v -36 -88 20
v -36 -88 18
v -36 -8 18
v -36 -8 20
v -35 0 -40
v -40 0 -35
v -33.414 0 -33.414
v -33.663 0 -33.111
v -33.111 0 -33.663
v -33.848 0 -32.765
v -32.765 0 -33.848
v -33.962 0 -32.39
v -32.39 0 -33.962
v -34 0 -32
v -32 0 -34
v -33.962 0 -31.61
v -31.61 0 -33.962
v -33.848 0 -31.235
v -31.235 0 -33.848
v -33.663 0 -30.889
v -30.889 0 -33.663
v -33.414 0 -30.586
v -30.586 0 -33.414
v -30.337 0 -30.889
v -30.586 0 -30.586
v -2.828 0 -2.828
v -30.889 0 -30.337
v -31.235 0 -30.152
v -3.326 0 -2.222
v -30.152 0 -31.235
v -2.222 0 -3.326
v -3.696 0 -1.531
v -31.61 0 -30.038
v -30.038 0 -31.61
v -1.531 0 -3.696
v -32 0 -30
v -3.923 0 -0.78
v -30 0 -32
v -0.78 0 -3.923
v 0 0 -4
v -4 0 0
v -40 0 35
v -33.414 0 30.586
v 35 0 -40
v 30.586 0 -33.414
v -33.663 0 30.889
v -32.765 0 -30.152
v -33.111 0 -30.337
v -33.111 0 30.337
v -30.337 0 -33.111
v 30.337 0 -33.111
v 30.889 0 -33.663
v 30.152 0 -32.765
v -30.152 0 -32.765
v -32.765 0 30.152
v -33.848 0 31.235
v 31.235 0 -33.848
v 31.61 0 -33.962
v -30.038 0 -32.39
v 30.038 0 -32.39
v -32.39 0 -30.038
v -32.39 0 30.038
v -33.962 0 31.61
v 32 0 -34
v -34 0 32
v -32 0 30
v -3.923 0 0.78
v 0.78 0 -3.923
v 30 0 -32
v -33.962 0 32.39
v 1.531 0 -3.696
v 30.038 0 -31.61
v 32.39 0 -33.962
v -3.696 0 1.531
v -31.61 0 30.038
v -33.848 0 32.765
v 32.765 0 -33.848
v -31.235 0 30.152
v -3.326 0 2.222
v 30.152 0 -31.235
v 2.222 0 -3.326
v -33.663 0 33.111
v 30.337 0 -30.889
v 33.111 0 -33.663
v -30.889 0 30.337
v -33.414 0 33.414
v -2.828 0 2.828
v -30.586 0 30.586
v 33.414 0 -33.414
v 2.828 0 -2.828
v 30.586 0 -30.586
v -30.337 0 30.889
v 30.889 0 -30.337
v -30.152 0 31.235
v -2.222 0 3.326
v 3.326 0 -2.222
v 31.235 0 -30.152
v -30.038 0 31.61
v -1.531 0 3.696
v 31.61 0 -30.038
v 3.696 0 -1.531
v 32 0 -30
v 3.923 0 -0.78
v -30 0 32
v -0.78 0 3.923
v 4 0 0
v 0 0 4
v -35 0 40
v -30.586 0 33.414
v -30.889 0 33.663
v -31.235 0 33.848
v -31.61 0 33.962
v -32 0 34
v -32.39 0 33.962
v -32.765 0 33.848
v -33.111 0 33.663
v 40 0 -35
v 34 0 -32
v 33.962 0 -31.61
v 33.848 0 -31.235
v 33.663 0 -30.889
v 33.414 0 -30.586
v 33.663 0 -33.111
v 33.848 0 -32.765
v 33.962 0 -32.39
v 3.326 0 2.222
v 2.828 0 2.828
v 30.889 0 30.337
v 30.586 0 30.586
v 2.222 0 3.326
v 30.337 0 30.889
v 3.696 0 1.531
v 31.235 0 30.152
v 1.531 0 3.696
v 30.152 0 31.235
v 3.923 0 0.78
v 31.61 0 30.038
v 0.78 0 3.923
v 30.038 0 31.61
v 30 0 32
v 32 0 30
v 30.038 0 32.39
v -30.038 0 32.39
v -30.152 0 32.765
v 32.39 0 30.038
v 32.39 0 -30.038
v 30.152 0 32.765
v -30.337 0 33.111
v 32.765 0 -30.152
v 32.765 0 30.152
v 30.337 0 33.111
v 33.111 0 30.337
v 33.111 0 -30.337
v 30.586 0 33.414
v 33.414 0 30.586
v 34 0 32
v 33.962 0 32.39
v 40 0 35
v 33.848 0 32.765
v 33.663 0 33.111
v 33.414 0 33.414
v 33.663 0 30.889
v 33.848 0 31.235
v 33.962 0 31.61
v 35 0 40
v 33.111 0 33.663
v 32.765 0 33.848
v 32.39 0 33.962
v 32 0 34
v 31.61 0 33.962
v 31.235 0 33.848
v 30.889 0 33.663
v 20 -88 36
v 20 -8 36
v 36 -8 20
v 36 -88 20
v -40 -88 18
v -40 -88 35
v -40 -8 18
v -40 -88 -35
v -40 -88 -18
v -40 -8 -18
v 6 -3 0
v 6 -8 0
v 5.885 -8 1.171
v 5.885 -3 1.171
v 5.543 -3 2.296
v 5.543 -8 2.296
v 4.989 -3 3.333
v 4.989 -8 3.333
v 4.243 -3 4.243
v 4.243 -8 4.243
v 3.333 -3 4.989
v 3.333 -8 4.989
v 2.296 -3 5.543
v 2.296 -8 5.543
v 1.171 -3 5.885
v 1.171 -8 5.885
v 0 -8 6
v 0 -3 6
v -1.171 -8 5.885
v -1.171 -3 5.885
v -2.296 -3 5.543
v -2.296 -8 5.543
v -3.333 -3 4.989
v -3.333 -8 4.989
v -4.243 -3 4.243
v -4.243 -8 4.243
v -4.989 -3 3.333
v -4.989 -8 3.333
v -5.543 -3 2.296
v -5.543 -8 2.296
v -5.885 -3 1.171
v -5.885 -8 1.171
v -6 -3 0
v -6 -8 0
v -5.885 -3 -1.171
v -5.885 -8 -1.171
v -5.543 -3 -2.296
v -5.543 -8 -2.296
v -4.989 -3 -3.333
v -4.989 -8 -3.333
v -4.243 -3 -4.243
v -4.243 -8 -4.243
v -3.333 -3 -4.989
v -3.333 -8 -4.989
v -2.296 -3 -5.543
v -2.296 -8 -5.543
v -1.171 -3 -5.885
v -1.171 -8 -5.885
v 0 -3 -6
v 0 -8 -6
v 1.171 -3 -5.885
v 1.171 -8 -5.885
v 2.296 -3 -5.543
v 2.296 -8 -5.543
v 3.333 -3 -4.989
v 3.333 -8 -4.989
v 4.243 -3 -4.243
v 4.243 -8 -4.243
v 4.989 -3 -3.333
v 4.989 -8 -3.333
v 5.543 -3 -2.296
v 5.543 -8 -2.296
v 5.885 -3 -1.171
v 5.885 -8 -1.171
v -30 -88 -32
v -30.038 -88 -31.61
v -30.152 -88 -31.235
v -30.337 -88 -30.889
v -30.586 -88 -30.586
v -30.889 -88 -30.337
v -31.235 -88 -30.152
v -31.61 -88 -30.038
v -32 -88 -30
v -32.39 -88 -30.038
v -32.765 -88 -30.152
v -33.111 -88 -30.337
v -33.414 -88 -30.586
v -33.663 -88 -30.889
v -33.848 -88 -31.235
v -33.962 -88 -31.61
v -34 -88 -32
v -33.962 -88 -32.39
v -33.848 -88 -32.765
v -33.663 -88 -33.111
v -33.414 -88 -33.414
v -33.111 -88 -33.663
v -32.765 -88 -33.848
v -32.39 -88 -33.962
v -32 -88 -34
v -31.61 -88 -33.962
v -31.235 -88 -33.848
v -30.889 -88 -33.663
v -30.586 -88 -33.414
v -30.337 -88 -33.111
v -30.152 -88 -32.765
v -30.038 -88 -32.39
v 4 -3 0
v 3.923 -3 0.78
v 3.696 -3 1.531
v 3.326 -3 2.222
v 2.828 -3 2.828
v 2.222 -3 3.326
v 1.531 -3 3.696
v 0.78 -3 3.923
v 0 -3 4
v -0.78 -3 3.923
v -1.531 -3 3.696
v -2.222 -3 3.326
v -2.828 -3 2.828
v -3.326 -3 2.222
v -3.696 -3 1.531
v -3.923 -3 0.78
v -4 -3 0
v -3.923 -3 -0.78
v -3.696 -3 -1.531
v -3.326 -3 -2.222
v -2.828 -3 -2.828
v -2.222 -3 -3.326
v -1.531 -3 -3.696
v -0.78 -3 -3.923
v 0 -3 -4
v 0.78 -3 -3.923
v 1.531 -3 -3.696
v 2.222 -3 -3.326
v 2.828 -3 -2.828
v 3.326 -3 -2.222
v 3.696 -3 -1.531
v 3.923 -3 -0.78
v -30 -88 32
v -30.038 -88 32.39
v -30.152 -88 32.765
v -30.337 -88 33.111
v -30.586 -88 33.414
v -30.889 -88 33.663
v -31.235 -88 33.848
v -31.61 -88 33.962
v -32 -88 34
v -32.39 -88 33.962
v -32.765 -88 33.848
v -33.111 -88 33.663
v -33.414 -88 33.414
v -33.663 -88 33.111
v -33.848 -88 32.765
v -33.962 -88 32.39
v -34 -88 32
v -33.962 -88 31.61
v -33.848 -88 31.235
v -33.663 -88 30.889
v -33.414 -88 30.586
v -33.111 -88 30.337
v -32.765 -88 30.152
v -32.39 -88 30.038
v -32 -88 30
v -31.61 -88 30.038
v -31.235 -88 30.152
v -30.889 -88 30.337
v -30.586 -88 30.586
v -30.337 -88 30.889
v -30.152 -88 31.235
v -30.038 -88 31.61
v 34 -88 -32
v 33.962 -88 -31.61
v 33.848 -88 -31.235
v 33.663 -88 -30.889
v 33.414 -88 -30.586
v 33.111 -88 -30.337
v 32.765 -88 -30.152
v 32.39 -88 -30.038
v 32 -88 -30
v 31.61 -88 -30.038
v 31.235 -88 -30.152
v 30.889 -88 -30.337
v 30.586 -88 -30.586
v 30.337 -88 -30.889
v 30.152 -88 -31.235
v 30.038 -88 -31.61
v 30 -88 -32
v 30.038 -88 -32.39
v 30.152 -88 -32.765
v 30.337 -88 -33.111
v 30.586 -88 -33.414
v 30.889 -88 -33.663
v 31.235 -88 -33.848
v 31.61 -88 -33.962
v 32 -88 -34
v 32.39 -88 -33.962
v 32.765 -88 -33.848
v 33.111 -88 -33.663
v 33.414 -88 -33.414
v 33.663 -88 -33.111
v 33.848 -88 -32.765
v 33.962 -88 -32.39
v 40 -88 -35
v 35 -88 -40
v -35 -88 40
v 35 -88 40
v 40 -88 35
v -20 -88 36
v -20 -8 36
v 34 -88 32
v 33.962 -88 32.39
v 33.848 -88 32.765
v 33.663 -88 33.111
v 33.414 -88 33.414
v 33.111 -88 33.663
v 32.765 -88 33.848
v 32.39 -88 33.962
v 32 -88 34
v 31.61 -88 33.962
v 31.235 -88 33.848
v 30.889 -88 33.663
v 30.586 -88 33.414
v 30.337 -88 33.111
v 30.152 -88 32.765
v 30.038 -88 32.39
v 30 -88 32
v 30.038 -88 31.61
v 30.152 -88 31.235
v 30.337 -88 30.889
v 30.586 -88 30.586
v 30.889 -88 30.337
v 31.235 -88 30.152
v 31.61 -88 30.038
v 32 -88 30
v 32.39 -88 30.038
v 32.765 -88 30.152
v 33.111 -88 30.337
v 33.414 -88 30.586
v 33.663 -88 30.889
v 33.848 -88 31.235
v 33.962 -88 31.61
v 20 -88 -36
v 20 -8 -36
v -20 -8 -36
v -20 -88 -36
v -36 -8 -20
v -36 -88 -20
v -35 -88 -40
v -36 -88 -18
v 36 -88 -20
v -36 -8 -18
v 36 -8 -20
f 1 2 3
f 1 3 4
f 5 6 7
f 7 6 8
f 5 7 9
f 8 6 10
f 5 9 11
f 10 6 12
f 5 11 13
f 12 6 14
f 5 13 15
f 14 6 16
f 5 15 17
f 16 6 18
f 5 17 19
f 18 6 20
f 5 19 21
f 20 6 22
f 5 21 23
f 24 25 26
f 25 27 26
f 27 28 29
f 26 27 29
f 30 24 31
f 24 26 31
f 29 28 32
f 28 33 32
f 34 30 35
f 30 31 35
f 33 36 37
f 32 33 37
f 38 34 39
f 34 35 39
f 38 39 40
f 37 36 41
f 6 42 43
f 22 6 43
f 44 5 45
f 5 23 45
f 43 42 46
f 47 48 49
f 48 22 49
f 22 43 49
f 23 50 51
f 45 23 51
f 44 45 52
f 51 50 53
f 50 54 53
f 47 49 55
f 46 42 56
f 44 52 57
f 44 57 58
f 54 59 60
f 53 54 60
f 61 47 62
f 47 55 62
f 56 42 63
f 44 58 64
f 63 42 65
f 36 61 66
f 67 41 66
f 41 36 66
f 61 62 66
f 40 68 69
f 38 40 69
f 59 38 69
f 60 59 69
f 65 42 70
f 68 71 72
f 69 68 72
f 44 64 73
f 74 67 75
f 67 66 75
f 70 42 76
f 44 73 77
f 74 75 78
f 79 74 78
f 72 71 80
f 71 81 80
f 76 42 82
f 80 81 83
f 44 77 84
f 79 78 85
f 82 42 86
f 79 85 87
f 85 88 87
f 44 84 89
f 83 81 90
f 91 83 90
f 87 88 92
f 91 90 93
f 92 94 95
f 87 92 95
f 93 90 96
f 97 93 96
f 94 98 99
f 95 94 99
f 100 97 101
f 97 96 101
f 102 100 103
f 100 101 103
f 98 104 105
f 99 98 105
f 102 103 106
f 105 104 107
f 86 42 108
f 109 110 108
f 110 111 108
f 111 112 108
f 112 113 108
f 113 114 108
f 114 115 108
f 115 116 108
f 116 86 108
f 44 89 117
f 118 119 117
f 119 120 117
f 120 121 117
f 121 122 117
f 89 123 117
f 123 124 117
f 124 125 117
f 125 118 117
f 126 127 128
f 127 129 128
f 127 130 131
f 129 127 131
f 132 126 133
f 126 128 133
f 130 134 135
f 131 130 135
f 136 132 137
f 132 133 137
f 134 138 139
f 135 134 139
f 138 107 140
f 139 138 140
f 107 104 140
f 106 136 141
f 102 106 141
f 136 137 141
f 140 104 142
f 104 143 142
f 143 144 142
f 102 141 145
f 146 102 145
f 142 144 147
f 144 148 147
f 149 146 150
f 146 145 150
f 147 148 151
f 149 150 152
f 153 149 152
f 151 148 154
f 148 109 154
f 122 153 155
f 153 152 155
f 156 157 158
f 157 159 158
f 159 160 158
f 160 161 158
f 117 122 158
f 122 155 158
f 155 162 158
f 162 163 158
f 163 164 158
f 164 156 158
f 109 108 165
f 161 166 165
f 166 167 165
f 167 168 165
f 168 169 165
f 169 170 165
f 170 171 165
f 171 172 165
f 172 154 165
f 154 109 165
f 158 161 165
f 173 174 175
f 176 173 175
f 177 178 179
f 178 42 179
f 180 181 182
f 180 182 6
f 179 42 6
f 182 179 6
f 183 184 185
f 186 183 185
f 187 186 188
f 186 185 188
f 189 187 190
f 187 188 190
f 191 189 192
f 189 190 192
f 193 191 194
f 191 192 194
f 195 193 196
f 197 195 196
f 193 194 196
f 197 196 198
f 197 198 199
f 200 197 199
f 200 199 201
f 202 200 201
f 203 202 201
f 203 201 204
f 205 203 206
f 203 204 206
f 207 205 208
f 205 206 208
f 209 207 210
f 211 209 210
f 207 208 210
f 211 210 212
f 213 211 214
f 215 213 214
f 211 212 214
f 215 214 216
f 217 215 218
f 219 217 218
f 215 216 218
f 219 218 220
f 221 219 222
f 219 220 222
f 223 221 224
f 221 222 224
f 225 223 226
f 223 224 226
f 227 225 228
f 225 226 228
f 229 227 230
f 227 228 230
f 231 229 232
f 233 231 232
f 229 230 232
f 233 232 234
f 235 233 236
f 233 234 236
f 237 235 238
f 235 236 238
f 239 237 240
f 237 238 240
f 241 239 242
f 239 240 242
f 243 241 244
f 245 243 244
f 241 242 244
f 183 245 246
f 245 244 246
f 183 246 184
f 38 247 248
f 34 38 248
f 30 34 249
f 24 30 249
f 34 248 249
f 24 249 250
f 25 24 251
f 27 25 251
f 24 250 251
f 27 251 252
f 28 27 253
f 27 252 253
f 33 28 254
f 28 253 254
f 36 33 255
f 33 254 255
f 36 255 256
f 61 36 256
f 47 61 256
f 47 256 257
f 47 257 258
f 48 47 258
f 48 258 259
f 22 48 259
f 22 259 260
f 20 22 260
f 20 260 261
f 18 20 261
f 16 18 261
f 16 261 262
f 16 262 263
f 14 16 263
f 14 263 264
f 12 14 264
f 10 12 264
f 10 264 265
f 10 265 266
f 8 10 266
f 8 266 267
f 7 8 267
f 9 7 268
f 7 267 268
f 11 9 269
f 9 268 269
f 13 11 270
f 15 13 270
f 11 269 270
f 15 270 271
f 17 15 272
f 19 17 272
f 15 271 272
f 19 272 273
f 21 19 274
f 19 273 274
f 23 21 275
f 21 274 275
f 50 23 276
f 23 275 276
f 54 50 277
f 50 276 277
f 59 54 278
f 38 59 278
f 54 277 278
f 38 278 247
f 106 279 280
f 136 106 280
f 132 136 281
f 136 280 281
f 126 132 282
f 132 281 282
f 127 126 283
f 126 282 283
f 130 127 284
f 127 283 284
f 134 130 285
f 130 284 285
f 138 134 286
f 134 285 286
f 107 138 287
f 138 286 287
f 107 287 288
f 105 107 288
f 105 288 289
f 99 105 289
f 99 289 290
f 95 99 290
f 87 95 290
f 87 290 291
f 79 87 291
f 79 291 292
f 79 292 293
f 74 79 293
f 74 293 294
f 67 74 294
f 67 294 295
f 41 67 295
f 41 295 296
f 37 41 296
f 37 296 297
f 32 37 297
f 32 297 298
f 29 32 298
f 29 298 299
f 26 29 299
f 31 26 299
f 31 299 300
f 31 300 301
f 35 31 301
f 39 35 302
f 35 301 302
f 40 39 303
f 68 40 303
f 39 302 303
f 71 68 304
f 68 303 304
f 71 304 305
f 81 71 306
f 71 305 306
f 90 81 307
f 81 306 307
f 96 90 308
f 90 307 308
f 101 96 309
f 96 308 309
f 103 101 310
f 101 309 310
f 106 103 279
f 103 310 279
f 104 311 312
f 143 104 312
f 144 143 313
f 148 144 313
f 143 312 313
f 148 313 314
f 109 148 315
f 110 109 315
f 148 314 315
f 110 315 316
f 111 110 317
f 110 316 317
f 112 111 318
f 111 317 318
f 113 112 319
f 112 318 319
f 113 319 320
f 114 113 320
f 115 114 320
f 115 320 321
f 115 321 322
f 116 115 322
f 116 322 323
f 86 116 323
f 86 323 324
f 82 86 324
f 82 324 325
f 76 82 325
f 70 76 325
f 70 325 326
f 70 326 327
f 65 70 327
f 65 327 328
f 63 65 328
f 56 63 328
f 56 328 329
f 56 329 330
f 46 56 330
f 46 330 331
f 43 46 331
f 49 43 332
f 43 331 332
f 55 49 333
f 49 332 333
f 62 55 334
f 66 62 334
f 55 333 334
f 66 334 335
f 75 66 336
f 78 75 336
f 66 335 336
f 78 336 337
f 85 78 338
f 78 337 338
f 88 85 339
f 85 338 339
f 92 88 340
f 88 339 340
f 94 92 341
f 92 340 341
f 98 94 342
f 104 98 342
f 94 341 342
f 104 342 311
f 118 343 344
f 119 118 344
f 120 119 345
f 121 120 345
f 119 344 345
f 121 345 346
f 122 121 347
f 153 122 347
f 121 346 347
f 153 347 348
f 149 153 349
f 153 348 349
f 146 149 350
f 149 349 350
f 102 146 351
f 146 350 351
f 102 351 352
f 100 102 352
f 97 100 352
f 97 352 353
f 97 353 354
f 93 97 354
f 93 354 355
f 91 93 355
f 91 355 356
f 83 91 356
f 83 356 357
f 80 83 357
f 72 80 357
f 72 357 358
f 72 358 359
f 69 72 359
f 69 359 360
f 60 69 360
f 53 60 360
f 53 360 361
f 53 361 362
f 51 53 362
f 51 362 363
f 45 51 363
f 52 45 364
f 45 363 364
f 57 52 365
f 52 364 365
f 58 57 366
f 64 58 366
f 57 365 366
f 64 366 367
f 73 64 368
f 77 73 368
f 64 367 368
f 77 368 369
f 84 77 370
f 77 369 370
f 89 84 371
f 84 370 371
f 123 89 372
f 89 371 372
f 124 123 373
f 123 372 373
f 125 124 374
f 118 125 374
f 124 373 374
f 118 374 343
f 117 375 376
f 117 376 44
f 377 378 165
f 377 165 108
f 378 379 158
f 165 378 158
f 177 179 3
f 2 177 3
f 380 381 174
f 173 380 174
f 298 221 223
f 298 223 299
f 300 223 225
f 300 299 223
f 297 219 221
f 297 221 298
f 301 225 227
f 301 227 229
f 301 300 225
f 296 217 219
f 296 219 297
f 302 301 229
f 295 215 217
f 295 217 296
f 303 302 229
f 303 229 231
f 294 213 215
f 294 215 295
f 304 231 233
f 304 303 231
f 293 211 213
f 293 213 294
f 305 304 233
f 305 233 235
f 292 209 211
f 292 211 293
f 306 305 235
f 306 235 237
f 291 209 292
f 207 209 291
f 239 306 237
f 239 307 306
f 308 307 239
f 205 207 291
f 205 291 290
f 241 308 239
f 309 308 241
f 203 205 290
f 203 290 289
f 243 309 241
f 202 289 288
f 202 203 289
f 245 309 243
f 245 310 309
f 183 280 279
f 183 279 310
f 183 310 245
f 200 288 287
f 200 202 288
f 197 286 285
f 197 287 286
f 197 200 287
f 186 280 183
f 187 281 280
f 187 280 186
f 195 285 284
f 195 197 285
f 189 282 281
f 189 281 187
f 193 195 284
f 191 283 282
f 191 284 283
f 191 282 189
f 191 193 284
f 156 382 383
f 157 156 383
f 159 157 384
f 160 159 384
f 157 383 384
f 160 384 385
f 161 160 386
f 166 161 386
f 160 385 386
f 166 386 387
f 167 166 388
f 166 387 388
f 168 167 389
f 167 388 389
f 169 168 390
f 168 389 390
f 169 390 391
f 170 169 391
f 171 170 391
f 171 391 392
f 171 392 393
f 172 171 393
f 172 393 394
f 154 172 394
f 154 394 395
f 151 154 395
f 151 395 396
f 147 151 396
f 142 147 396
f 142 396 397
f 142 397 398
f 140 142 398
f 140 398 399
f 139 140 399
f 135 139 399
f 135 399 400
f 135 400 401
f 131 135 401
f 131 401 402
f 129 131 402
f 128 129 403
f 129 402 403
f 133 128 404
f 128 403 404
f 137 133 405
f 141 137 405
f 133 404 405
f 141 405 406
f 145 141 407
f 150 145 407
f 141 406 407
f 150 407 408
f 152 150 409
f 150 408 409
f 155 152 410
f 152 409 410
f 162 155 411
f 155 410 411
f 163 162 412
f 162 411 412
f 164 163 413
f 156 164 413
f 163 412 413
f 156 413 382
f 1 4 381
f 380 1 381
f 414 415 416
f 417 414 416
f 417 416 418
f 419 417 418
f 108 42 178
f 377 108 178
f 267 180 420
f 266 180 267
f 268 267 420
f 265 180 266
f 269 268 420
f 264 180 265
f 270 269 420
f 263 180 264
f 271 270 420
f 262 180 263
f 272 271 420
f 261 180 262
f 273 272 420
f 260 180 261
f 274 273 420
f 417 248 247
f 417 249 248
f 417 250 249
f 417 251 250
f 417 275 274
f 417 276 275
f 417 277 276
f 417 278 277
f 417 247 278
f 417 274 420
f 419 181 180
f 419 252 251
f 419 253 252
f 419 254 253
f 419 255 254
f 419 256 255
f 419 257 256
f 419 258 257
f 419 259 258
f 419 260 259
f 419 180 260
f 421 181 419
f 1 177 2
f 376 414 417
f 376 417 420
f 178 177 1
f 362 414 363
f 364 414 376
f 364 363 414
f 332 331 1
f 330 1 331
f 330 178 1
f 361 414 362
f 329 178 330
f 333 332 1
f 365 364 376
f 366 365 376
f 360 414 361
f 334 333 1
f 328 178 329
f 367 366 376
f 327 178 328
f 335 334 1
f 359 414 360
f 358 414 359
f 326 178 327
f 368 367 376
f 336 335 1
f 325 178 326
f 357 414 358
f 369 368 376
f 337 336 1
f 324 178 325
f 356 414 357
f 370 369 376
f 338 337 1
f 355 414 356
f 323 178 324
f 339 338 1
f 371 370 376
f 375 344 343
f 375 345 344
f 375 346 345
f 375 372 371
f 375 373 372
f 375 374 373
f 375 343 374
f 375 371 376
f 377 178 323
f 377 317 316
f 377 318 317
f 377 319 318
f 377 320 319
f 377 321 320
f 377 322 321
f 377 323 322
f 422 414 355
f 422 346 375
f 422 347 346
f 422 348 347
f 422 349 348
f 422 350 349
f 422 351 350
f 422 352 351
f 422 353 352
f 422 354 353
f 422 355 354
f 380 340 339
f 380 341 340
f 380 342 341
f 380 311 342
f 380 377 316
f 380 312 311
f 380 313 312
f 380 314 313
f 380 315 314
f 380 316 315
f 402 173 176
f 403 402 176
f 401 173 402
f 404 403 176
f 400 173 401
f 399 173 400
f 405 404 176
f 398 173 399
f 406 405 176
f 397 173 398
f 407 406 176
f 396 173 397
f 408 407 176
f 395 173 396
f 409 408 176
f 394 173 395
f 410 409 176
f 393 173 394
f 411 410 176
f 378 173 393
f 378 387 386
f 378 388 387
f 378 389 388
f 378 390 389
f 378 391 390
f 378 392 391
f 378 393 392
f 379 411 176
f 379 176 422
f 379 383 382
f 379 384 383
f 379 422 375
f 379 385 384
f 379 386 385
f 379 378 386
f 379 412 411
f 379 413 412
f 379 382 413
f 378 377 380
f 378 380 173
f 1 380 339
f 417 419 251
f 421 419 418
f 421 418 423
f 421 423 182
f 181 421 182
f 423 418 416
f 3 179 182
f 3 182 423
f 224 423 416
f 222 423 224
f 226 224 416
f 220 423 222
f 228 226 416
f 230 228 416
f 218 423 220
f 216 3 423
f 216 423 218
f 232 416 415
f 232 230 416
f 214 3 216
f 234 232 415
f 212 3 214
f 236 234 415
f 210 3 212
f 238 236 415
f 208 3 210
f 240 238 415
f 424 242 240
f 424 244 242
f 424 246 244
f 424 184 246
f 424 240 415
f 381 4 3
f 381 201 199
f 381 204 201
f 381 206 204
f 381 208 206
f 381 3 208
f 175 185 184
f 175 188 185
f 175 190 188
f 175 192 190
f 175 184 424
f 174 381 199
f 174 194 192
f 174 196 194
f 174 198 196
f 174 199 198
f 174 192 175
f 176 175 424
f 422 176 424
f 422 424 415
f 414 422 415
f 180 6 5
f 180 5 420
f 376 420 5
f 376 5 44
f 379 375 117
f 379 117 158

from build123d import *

# Parameters (mm, degrees)
F0_W      = 80
F0_H      = 80
F1_DEPTH  = 8
F2_R      = 4
F3_DEPTH  = 8.001
F5_DEPTH  = 80
F6_SIZE   = 5
F7_R      = 2
F8_DEPTH  = 88.001
F9_R      = 6
F10_DEPTH = 5


with BuildPart() as f1:
    # F0 (on Front) → F1 (new body)
    with BuildSketch(Plane.XZ):
        Rectangle(F0_W, F0_H)
    extrude(amount=F1_DEPTH)

    # F2 (on face) → F3 (cut, through all)
    with BuildSketch(Plane.XZ.offset(8)):
        Circle(F2_R)
    extrude(amount=-F3_DEPTH, mode=Mode.SUBTRACT)

    # F4 (on face) → F5 (join)
    with BuildSketch(Plane.XZ.offset(8)):
        Polygon((40, 40), (-40, 40), (-40, 18), (-36, 18), (-36, 20), (-20, 36), (20, 36), (36, 20), (36, 0), (36, -20), (20, -36), (-20, -36), (-36, -20), (-36, -18), (-40, -18), (-40, -40), (40, -40), align=None)
    extrude(amount=F5_DEPTH)

    # F6
    f6_edges = [f1.edges().sort_by_distance(p)[0] for p in [
        (-40, -44, 40),
        (40, -44, 40),
        (-40, -44, -40),
        (40, -44, -40),
    ]]
    chamfer(f6_edges, length=F6_SIZE)

    # F7 (on face) → F8 (cut, through all)
    with BuildSketch(Plane.XZ.offset(88)):
        with Locations((-32, 32)):
            Circle(F7_R)
        with Locations((-32, -32)):
            Circle(F7_R)
        with Locations((32, -32)):
            Circle(F7_R)
        with Locations((32, 32)):
            Circle(F7_R)
    extrude(amount=-F8_DEPTH, mode=Mode.SUBTRACT)

    # F9 (on face) → F10 (cut)
    with BuildSketch(Plane.XZ.offset(8)):
        Circle(F9_R)
    extrude(amount=-F10_DEPTH, mode=Mode.SUBTRACT)


solid = f1.part
